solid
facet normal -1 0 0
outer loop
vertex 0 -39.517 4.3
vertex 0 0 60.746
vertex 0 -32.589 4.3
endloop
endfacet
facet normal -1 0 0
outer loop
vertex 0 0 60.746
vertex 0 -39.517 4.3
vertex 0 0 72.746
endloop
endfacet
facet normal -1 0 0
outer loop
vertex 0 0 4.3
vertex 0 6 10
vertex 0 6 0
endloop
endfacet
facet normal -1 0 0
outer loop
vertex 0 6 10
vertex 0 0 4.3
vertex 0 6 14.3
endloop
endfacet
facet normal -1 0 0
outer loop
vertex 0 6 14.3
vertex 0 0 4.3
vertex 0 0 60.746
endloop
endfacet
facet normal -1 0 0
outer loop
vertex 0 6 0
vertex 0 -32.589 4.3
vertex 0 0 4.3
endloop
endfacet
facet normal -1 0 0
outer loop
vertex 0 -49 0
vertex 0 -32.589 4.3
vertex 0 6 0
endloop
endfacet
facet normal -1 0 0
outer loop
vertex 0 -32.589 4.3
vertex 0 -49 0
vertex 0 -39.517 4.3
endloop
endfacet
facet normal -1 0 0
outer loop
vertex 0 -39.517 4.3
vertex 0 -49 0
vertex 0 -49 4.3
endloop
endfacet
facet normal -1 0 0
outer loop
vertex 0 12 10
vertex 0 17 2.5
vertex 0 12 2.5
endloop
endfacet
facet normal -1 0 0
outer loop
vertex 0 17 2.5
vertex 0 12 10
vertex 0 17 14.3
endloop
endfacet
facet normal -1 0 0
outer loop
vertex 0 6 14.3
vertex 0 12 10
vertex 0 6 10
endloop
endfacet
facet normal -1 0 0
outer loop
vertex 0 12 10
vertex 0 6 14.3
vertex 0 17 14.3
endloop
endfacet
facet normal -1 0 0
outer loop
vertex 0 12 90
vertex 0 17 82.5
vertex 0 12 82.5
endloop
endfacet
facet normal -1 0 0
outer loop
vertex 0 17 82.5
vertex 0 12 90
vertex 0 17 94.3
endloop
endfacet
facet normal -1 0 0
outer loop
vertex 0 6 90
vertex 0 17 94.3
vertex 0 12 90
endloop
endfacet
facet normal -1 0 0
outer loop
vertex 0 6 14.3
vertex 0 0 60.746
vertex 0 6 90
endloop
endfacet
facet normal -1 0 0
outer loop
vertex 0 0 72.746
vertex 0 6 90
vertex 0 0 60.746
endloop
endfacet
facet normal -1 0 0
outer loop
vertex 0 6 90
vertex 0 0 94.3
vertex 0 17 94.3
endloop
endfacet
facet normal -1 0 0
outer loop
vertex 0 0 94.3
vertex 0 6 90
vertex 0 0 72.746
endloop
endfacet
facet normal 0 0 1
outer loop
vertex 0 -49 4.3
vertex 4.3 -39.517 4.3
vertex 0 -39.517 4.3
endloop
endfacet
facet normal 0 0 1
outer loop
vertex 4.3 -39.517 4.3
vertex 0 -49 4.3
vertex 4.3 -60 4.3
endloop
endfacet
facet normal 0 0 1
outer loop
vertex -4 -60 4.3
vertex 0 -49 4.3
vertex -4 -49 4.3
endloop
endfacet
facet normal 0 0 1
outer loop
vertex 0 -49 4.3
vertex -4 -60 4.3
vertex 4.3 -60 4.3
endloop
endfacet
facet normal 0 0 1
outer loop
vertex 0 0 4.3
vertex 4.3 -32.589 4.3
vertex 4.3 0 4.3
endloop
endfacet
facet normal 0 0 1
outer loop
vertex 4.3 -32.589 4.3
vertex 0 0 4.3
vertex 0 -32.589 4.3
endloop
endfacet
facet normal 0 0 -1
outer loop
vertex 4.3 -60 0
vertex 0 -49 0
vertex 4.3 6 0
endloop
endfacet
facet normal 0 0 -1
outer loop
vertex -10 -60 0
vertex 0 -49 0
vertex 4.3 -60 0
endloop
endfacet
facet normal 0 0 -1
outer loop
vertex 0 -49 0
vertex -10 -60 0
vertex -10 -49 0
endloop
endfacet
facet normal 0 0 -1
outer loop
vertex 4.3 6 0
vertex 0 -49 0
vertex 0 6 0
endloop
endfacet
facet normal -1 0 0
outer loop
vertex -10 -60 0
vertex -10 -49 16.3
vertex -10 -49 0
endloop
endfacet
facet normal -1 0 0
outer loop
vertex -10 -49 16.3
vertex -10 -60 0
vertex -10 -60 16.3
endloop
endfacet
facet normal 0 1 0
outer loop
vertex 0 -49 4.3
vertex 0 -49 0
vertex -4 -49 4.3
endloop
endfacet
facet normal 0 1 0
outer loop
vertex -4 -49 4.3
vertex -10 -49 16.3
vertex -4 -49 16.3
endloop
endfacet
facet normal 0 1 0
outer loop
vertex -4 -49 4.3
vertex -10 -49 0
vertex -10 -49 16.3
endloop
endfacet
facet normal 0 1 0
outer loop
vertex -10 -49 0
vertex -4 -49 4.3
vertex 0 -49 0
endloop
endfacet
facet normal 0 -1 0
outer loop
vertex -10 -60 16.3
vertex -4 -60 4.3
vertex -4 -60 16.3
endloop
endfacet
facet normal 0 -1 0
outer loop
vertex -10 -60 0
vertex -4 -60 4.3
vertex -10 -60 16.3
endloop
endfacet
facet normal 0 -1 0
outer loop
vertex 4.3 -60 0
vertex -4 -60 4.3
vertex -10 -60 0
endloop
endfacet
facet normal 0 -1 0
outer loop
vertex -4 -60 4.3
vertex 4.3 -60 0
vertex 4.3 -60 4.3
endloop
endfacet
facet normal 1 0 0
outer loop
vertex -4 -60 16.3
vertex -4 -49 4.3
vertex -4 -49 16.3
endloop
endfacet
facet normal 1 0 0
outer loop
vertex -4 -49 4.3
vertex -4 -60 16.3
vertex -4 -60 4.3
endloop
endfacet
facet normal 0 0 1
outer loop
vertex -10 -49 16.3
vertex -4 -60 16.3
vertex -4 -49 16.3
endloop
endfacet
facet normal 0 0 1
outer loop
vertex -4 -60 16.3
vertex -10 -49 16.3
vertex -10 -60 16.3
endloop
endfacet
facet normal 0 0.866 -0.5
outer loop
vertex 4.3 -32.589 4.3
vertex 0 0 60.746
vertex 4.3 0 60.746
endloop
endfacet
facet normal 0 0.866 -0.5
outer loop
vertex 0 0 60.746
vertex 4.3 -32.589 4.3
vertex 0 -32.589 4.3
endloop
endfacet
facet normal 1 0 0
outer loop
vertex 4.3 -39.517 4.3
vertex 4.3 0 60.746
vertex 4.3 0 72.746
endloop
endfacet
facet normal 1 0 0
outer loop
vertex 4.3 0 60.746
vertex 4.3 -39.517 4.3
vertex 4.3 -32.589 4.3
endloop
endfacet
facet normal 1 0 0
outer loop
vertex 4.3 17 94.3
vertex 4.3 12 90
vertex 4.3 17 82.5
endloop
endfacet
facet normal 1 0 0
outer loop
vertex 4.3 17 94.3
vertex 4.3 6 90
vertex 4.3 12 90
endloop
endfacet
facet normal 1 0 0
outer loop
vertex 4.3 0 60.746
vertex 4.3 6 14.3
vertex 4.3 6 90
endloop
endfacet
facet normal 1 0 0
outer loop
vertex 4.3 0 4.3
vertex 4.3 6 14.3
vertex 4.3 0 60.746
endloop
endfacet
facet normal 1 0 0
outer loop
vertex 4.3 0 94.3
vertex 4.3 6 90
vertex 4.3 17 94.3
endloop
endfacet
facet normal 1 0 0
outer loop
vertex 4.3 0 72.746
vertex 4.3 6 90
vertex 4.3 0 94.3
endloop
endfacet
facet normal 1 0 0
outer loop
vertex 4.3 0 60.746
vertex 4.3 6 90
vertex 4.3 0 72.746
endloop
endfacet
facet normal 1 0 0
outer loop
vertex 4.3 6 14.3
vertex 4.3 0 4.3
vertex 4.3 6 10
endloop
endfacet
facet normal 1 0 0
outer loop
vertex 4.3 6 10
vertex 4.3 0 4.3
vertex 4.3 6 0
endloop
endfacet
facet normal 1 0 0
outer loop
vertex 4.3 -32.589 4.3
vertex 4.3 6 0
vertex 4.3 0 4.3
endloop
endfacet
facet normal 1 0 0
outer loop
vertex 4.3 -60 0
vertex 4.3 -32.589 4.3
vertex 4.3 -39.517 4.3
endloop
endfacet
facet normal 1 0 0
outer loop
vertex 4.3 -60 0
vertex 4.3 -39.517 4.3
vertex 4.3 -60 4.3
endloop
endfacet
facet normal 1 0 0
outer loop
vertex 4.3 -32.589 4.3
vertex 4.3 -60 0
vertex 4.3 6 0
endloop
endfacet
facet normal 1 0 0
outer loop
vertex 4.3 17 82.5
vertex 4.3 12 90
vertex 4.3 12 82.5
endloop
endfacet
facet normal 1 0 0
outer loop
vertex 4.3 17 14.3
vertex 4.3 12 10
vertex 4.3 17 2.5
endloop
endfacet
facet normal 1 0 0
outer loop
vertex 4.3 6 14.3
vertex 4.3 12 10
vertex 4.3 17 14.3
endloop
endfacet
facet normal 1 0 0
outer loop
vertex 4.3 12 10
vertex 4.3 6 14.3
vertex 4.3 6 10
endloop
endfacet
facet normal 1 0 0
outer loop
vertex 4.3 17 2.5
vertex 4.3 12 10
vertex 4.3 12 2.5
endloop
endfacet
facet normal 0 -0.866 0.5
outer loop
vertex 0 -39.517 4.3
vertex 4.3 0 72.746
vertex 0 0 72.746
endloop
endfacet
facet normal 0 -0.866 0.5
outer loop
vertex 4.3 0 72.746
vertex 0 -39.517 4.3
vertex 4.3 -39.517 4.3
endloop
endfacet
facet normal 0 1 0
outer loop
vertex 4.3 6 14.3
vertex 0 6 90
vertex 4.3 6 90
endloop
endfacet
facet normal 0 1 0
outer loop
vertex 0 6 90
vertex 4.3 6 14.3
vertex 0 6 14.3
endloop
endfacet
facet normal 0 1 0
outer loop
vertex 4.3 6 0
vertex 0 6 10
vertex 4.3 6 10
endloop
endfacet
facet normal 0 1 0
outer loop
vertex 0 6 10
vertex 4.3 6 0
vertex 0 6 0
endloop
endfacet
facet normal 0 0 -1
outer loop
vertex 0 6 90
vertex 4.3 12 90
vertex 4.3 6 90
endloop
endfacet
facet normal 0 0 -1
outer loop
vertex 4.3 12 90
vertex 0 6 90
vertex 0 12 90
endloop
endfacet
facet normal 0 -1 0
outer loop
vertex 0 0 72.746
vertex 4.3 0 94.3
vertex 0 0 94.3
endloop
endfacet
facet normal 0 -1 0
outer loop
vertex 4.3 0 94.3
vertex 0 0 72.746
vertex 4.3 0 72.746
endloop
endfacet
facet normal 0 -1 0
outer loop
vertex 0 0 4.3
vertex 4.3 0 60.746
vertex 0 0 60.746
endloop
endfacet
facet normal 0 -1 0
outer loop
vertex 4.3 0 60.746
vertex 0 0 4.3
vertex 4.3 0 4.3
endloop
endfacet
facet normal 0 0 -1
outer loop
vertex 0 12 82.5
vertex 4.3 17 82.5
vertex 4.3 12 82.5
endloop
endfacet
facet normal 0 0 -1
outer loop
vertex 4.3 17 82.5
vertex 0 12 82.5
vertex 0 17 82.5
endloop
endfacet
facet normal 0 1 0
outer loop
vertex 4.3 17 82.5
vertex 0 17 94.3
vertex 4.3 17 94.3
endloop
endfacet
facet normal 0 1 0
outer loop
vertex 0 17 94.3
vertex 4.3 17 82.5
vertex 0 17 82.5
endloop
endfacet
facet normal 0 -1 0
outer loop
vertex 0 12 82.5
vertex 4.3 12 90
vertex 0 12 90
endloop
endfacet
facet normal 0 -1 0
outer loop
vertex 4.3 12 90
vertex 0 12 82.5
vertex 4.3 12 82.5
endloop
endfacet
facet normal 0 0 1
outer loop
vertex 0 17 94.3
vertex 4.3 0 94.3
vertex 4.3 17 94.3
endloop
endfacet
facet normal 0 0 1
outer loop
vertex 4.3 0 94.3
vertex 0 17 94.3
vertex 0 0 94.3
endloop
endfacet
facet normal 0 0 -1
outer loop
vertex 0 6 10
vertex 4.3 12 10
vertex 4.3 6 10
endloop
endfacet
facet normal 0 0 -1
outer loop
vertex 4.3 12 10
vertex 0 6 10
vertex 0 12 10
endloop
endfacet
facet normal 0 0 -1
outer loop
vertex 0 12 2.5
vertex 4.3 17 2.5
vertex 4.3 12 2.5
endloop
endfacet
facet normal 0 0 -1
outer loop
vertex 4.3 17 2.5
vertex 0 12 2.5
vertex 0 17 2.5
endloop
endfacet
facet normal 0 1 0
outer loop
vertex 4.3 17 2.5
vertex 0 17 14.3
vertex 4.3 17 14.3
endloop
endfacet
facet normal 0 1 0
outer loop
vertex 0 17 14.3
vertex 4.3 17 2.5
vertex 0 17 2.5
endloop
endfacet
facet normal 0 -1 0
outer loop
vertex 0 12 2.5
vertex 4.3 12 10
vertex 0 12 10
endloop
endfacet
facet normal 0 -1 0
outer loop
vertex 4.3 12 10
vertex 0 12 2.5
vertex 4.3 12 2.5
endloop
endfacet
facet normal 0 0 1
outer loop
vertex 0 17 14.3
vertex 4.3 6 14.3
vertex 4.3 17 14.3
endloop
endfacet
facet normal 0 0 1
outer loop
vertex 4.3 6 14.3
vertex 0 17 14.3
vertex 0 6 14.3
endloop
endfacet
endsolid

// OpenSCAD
h = 90;
w = 4.3;
d = 6;

ikea_d = 5;
ikea_hole_h = 7.5;

grip = 3;

base_grip = 11;

support_d = 60;

finger_d = 10;

cut = 3;

sx_dx = 0; //0 DX, 1 SX


color("yellow")
cube([w,d,h]);

color("green")
translate([0,d*2,h - ikea_hole_h]) cube([w,ikea_d,ikea_hole_h ]);

color("violet")
translate([0,0,h]) cube([w,d*2+ikea_d,w ]);

color("green")
translate([0,d*2,h - ikea_hole_h -80]) cube([w,ikea_d,ikea_hole_h ]);

color("violet")
translate([0,0,h -80 ]) cube([w,d*2+ikea_d,w ]);


color("blue")
translate([0,-support_d,0]) cube([w, support_d, w]);

if (sx_dx == 0) {
    color("red")
    translate([-finger_d,-support_d,0]) cube([finger_d,base_grip,w]);
        
    color("black")
    translate([-finger_d,-support_d,w]) cube([d,base_grip,d * 2]);
}

if (sx_dx == 1) {
    color("red")
    translate([w,-support_d,0]) cube([finger_d,base_grip,w]);
        
    color("black")
    translate([w + finger_d - d,-support_d,w]) cube([d,base_grip,d * 2]);
}

color("orange")
difference() {
    translate([0,-support_d + d * 3,0]) rotate([-30,0,0]) cube([w,d,h]);
    translate([-cut,d,0]) cube([w + cut * 2,d,h]);
    translate([-cut,-support_d,-w]) cube([w + cut * 2, support_d, w]);
}
